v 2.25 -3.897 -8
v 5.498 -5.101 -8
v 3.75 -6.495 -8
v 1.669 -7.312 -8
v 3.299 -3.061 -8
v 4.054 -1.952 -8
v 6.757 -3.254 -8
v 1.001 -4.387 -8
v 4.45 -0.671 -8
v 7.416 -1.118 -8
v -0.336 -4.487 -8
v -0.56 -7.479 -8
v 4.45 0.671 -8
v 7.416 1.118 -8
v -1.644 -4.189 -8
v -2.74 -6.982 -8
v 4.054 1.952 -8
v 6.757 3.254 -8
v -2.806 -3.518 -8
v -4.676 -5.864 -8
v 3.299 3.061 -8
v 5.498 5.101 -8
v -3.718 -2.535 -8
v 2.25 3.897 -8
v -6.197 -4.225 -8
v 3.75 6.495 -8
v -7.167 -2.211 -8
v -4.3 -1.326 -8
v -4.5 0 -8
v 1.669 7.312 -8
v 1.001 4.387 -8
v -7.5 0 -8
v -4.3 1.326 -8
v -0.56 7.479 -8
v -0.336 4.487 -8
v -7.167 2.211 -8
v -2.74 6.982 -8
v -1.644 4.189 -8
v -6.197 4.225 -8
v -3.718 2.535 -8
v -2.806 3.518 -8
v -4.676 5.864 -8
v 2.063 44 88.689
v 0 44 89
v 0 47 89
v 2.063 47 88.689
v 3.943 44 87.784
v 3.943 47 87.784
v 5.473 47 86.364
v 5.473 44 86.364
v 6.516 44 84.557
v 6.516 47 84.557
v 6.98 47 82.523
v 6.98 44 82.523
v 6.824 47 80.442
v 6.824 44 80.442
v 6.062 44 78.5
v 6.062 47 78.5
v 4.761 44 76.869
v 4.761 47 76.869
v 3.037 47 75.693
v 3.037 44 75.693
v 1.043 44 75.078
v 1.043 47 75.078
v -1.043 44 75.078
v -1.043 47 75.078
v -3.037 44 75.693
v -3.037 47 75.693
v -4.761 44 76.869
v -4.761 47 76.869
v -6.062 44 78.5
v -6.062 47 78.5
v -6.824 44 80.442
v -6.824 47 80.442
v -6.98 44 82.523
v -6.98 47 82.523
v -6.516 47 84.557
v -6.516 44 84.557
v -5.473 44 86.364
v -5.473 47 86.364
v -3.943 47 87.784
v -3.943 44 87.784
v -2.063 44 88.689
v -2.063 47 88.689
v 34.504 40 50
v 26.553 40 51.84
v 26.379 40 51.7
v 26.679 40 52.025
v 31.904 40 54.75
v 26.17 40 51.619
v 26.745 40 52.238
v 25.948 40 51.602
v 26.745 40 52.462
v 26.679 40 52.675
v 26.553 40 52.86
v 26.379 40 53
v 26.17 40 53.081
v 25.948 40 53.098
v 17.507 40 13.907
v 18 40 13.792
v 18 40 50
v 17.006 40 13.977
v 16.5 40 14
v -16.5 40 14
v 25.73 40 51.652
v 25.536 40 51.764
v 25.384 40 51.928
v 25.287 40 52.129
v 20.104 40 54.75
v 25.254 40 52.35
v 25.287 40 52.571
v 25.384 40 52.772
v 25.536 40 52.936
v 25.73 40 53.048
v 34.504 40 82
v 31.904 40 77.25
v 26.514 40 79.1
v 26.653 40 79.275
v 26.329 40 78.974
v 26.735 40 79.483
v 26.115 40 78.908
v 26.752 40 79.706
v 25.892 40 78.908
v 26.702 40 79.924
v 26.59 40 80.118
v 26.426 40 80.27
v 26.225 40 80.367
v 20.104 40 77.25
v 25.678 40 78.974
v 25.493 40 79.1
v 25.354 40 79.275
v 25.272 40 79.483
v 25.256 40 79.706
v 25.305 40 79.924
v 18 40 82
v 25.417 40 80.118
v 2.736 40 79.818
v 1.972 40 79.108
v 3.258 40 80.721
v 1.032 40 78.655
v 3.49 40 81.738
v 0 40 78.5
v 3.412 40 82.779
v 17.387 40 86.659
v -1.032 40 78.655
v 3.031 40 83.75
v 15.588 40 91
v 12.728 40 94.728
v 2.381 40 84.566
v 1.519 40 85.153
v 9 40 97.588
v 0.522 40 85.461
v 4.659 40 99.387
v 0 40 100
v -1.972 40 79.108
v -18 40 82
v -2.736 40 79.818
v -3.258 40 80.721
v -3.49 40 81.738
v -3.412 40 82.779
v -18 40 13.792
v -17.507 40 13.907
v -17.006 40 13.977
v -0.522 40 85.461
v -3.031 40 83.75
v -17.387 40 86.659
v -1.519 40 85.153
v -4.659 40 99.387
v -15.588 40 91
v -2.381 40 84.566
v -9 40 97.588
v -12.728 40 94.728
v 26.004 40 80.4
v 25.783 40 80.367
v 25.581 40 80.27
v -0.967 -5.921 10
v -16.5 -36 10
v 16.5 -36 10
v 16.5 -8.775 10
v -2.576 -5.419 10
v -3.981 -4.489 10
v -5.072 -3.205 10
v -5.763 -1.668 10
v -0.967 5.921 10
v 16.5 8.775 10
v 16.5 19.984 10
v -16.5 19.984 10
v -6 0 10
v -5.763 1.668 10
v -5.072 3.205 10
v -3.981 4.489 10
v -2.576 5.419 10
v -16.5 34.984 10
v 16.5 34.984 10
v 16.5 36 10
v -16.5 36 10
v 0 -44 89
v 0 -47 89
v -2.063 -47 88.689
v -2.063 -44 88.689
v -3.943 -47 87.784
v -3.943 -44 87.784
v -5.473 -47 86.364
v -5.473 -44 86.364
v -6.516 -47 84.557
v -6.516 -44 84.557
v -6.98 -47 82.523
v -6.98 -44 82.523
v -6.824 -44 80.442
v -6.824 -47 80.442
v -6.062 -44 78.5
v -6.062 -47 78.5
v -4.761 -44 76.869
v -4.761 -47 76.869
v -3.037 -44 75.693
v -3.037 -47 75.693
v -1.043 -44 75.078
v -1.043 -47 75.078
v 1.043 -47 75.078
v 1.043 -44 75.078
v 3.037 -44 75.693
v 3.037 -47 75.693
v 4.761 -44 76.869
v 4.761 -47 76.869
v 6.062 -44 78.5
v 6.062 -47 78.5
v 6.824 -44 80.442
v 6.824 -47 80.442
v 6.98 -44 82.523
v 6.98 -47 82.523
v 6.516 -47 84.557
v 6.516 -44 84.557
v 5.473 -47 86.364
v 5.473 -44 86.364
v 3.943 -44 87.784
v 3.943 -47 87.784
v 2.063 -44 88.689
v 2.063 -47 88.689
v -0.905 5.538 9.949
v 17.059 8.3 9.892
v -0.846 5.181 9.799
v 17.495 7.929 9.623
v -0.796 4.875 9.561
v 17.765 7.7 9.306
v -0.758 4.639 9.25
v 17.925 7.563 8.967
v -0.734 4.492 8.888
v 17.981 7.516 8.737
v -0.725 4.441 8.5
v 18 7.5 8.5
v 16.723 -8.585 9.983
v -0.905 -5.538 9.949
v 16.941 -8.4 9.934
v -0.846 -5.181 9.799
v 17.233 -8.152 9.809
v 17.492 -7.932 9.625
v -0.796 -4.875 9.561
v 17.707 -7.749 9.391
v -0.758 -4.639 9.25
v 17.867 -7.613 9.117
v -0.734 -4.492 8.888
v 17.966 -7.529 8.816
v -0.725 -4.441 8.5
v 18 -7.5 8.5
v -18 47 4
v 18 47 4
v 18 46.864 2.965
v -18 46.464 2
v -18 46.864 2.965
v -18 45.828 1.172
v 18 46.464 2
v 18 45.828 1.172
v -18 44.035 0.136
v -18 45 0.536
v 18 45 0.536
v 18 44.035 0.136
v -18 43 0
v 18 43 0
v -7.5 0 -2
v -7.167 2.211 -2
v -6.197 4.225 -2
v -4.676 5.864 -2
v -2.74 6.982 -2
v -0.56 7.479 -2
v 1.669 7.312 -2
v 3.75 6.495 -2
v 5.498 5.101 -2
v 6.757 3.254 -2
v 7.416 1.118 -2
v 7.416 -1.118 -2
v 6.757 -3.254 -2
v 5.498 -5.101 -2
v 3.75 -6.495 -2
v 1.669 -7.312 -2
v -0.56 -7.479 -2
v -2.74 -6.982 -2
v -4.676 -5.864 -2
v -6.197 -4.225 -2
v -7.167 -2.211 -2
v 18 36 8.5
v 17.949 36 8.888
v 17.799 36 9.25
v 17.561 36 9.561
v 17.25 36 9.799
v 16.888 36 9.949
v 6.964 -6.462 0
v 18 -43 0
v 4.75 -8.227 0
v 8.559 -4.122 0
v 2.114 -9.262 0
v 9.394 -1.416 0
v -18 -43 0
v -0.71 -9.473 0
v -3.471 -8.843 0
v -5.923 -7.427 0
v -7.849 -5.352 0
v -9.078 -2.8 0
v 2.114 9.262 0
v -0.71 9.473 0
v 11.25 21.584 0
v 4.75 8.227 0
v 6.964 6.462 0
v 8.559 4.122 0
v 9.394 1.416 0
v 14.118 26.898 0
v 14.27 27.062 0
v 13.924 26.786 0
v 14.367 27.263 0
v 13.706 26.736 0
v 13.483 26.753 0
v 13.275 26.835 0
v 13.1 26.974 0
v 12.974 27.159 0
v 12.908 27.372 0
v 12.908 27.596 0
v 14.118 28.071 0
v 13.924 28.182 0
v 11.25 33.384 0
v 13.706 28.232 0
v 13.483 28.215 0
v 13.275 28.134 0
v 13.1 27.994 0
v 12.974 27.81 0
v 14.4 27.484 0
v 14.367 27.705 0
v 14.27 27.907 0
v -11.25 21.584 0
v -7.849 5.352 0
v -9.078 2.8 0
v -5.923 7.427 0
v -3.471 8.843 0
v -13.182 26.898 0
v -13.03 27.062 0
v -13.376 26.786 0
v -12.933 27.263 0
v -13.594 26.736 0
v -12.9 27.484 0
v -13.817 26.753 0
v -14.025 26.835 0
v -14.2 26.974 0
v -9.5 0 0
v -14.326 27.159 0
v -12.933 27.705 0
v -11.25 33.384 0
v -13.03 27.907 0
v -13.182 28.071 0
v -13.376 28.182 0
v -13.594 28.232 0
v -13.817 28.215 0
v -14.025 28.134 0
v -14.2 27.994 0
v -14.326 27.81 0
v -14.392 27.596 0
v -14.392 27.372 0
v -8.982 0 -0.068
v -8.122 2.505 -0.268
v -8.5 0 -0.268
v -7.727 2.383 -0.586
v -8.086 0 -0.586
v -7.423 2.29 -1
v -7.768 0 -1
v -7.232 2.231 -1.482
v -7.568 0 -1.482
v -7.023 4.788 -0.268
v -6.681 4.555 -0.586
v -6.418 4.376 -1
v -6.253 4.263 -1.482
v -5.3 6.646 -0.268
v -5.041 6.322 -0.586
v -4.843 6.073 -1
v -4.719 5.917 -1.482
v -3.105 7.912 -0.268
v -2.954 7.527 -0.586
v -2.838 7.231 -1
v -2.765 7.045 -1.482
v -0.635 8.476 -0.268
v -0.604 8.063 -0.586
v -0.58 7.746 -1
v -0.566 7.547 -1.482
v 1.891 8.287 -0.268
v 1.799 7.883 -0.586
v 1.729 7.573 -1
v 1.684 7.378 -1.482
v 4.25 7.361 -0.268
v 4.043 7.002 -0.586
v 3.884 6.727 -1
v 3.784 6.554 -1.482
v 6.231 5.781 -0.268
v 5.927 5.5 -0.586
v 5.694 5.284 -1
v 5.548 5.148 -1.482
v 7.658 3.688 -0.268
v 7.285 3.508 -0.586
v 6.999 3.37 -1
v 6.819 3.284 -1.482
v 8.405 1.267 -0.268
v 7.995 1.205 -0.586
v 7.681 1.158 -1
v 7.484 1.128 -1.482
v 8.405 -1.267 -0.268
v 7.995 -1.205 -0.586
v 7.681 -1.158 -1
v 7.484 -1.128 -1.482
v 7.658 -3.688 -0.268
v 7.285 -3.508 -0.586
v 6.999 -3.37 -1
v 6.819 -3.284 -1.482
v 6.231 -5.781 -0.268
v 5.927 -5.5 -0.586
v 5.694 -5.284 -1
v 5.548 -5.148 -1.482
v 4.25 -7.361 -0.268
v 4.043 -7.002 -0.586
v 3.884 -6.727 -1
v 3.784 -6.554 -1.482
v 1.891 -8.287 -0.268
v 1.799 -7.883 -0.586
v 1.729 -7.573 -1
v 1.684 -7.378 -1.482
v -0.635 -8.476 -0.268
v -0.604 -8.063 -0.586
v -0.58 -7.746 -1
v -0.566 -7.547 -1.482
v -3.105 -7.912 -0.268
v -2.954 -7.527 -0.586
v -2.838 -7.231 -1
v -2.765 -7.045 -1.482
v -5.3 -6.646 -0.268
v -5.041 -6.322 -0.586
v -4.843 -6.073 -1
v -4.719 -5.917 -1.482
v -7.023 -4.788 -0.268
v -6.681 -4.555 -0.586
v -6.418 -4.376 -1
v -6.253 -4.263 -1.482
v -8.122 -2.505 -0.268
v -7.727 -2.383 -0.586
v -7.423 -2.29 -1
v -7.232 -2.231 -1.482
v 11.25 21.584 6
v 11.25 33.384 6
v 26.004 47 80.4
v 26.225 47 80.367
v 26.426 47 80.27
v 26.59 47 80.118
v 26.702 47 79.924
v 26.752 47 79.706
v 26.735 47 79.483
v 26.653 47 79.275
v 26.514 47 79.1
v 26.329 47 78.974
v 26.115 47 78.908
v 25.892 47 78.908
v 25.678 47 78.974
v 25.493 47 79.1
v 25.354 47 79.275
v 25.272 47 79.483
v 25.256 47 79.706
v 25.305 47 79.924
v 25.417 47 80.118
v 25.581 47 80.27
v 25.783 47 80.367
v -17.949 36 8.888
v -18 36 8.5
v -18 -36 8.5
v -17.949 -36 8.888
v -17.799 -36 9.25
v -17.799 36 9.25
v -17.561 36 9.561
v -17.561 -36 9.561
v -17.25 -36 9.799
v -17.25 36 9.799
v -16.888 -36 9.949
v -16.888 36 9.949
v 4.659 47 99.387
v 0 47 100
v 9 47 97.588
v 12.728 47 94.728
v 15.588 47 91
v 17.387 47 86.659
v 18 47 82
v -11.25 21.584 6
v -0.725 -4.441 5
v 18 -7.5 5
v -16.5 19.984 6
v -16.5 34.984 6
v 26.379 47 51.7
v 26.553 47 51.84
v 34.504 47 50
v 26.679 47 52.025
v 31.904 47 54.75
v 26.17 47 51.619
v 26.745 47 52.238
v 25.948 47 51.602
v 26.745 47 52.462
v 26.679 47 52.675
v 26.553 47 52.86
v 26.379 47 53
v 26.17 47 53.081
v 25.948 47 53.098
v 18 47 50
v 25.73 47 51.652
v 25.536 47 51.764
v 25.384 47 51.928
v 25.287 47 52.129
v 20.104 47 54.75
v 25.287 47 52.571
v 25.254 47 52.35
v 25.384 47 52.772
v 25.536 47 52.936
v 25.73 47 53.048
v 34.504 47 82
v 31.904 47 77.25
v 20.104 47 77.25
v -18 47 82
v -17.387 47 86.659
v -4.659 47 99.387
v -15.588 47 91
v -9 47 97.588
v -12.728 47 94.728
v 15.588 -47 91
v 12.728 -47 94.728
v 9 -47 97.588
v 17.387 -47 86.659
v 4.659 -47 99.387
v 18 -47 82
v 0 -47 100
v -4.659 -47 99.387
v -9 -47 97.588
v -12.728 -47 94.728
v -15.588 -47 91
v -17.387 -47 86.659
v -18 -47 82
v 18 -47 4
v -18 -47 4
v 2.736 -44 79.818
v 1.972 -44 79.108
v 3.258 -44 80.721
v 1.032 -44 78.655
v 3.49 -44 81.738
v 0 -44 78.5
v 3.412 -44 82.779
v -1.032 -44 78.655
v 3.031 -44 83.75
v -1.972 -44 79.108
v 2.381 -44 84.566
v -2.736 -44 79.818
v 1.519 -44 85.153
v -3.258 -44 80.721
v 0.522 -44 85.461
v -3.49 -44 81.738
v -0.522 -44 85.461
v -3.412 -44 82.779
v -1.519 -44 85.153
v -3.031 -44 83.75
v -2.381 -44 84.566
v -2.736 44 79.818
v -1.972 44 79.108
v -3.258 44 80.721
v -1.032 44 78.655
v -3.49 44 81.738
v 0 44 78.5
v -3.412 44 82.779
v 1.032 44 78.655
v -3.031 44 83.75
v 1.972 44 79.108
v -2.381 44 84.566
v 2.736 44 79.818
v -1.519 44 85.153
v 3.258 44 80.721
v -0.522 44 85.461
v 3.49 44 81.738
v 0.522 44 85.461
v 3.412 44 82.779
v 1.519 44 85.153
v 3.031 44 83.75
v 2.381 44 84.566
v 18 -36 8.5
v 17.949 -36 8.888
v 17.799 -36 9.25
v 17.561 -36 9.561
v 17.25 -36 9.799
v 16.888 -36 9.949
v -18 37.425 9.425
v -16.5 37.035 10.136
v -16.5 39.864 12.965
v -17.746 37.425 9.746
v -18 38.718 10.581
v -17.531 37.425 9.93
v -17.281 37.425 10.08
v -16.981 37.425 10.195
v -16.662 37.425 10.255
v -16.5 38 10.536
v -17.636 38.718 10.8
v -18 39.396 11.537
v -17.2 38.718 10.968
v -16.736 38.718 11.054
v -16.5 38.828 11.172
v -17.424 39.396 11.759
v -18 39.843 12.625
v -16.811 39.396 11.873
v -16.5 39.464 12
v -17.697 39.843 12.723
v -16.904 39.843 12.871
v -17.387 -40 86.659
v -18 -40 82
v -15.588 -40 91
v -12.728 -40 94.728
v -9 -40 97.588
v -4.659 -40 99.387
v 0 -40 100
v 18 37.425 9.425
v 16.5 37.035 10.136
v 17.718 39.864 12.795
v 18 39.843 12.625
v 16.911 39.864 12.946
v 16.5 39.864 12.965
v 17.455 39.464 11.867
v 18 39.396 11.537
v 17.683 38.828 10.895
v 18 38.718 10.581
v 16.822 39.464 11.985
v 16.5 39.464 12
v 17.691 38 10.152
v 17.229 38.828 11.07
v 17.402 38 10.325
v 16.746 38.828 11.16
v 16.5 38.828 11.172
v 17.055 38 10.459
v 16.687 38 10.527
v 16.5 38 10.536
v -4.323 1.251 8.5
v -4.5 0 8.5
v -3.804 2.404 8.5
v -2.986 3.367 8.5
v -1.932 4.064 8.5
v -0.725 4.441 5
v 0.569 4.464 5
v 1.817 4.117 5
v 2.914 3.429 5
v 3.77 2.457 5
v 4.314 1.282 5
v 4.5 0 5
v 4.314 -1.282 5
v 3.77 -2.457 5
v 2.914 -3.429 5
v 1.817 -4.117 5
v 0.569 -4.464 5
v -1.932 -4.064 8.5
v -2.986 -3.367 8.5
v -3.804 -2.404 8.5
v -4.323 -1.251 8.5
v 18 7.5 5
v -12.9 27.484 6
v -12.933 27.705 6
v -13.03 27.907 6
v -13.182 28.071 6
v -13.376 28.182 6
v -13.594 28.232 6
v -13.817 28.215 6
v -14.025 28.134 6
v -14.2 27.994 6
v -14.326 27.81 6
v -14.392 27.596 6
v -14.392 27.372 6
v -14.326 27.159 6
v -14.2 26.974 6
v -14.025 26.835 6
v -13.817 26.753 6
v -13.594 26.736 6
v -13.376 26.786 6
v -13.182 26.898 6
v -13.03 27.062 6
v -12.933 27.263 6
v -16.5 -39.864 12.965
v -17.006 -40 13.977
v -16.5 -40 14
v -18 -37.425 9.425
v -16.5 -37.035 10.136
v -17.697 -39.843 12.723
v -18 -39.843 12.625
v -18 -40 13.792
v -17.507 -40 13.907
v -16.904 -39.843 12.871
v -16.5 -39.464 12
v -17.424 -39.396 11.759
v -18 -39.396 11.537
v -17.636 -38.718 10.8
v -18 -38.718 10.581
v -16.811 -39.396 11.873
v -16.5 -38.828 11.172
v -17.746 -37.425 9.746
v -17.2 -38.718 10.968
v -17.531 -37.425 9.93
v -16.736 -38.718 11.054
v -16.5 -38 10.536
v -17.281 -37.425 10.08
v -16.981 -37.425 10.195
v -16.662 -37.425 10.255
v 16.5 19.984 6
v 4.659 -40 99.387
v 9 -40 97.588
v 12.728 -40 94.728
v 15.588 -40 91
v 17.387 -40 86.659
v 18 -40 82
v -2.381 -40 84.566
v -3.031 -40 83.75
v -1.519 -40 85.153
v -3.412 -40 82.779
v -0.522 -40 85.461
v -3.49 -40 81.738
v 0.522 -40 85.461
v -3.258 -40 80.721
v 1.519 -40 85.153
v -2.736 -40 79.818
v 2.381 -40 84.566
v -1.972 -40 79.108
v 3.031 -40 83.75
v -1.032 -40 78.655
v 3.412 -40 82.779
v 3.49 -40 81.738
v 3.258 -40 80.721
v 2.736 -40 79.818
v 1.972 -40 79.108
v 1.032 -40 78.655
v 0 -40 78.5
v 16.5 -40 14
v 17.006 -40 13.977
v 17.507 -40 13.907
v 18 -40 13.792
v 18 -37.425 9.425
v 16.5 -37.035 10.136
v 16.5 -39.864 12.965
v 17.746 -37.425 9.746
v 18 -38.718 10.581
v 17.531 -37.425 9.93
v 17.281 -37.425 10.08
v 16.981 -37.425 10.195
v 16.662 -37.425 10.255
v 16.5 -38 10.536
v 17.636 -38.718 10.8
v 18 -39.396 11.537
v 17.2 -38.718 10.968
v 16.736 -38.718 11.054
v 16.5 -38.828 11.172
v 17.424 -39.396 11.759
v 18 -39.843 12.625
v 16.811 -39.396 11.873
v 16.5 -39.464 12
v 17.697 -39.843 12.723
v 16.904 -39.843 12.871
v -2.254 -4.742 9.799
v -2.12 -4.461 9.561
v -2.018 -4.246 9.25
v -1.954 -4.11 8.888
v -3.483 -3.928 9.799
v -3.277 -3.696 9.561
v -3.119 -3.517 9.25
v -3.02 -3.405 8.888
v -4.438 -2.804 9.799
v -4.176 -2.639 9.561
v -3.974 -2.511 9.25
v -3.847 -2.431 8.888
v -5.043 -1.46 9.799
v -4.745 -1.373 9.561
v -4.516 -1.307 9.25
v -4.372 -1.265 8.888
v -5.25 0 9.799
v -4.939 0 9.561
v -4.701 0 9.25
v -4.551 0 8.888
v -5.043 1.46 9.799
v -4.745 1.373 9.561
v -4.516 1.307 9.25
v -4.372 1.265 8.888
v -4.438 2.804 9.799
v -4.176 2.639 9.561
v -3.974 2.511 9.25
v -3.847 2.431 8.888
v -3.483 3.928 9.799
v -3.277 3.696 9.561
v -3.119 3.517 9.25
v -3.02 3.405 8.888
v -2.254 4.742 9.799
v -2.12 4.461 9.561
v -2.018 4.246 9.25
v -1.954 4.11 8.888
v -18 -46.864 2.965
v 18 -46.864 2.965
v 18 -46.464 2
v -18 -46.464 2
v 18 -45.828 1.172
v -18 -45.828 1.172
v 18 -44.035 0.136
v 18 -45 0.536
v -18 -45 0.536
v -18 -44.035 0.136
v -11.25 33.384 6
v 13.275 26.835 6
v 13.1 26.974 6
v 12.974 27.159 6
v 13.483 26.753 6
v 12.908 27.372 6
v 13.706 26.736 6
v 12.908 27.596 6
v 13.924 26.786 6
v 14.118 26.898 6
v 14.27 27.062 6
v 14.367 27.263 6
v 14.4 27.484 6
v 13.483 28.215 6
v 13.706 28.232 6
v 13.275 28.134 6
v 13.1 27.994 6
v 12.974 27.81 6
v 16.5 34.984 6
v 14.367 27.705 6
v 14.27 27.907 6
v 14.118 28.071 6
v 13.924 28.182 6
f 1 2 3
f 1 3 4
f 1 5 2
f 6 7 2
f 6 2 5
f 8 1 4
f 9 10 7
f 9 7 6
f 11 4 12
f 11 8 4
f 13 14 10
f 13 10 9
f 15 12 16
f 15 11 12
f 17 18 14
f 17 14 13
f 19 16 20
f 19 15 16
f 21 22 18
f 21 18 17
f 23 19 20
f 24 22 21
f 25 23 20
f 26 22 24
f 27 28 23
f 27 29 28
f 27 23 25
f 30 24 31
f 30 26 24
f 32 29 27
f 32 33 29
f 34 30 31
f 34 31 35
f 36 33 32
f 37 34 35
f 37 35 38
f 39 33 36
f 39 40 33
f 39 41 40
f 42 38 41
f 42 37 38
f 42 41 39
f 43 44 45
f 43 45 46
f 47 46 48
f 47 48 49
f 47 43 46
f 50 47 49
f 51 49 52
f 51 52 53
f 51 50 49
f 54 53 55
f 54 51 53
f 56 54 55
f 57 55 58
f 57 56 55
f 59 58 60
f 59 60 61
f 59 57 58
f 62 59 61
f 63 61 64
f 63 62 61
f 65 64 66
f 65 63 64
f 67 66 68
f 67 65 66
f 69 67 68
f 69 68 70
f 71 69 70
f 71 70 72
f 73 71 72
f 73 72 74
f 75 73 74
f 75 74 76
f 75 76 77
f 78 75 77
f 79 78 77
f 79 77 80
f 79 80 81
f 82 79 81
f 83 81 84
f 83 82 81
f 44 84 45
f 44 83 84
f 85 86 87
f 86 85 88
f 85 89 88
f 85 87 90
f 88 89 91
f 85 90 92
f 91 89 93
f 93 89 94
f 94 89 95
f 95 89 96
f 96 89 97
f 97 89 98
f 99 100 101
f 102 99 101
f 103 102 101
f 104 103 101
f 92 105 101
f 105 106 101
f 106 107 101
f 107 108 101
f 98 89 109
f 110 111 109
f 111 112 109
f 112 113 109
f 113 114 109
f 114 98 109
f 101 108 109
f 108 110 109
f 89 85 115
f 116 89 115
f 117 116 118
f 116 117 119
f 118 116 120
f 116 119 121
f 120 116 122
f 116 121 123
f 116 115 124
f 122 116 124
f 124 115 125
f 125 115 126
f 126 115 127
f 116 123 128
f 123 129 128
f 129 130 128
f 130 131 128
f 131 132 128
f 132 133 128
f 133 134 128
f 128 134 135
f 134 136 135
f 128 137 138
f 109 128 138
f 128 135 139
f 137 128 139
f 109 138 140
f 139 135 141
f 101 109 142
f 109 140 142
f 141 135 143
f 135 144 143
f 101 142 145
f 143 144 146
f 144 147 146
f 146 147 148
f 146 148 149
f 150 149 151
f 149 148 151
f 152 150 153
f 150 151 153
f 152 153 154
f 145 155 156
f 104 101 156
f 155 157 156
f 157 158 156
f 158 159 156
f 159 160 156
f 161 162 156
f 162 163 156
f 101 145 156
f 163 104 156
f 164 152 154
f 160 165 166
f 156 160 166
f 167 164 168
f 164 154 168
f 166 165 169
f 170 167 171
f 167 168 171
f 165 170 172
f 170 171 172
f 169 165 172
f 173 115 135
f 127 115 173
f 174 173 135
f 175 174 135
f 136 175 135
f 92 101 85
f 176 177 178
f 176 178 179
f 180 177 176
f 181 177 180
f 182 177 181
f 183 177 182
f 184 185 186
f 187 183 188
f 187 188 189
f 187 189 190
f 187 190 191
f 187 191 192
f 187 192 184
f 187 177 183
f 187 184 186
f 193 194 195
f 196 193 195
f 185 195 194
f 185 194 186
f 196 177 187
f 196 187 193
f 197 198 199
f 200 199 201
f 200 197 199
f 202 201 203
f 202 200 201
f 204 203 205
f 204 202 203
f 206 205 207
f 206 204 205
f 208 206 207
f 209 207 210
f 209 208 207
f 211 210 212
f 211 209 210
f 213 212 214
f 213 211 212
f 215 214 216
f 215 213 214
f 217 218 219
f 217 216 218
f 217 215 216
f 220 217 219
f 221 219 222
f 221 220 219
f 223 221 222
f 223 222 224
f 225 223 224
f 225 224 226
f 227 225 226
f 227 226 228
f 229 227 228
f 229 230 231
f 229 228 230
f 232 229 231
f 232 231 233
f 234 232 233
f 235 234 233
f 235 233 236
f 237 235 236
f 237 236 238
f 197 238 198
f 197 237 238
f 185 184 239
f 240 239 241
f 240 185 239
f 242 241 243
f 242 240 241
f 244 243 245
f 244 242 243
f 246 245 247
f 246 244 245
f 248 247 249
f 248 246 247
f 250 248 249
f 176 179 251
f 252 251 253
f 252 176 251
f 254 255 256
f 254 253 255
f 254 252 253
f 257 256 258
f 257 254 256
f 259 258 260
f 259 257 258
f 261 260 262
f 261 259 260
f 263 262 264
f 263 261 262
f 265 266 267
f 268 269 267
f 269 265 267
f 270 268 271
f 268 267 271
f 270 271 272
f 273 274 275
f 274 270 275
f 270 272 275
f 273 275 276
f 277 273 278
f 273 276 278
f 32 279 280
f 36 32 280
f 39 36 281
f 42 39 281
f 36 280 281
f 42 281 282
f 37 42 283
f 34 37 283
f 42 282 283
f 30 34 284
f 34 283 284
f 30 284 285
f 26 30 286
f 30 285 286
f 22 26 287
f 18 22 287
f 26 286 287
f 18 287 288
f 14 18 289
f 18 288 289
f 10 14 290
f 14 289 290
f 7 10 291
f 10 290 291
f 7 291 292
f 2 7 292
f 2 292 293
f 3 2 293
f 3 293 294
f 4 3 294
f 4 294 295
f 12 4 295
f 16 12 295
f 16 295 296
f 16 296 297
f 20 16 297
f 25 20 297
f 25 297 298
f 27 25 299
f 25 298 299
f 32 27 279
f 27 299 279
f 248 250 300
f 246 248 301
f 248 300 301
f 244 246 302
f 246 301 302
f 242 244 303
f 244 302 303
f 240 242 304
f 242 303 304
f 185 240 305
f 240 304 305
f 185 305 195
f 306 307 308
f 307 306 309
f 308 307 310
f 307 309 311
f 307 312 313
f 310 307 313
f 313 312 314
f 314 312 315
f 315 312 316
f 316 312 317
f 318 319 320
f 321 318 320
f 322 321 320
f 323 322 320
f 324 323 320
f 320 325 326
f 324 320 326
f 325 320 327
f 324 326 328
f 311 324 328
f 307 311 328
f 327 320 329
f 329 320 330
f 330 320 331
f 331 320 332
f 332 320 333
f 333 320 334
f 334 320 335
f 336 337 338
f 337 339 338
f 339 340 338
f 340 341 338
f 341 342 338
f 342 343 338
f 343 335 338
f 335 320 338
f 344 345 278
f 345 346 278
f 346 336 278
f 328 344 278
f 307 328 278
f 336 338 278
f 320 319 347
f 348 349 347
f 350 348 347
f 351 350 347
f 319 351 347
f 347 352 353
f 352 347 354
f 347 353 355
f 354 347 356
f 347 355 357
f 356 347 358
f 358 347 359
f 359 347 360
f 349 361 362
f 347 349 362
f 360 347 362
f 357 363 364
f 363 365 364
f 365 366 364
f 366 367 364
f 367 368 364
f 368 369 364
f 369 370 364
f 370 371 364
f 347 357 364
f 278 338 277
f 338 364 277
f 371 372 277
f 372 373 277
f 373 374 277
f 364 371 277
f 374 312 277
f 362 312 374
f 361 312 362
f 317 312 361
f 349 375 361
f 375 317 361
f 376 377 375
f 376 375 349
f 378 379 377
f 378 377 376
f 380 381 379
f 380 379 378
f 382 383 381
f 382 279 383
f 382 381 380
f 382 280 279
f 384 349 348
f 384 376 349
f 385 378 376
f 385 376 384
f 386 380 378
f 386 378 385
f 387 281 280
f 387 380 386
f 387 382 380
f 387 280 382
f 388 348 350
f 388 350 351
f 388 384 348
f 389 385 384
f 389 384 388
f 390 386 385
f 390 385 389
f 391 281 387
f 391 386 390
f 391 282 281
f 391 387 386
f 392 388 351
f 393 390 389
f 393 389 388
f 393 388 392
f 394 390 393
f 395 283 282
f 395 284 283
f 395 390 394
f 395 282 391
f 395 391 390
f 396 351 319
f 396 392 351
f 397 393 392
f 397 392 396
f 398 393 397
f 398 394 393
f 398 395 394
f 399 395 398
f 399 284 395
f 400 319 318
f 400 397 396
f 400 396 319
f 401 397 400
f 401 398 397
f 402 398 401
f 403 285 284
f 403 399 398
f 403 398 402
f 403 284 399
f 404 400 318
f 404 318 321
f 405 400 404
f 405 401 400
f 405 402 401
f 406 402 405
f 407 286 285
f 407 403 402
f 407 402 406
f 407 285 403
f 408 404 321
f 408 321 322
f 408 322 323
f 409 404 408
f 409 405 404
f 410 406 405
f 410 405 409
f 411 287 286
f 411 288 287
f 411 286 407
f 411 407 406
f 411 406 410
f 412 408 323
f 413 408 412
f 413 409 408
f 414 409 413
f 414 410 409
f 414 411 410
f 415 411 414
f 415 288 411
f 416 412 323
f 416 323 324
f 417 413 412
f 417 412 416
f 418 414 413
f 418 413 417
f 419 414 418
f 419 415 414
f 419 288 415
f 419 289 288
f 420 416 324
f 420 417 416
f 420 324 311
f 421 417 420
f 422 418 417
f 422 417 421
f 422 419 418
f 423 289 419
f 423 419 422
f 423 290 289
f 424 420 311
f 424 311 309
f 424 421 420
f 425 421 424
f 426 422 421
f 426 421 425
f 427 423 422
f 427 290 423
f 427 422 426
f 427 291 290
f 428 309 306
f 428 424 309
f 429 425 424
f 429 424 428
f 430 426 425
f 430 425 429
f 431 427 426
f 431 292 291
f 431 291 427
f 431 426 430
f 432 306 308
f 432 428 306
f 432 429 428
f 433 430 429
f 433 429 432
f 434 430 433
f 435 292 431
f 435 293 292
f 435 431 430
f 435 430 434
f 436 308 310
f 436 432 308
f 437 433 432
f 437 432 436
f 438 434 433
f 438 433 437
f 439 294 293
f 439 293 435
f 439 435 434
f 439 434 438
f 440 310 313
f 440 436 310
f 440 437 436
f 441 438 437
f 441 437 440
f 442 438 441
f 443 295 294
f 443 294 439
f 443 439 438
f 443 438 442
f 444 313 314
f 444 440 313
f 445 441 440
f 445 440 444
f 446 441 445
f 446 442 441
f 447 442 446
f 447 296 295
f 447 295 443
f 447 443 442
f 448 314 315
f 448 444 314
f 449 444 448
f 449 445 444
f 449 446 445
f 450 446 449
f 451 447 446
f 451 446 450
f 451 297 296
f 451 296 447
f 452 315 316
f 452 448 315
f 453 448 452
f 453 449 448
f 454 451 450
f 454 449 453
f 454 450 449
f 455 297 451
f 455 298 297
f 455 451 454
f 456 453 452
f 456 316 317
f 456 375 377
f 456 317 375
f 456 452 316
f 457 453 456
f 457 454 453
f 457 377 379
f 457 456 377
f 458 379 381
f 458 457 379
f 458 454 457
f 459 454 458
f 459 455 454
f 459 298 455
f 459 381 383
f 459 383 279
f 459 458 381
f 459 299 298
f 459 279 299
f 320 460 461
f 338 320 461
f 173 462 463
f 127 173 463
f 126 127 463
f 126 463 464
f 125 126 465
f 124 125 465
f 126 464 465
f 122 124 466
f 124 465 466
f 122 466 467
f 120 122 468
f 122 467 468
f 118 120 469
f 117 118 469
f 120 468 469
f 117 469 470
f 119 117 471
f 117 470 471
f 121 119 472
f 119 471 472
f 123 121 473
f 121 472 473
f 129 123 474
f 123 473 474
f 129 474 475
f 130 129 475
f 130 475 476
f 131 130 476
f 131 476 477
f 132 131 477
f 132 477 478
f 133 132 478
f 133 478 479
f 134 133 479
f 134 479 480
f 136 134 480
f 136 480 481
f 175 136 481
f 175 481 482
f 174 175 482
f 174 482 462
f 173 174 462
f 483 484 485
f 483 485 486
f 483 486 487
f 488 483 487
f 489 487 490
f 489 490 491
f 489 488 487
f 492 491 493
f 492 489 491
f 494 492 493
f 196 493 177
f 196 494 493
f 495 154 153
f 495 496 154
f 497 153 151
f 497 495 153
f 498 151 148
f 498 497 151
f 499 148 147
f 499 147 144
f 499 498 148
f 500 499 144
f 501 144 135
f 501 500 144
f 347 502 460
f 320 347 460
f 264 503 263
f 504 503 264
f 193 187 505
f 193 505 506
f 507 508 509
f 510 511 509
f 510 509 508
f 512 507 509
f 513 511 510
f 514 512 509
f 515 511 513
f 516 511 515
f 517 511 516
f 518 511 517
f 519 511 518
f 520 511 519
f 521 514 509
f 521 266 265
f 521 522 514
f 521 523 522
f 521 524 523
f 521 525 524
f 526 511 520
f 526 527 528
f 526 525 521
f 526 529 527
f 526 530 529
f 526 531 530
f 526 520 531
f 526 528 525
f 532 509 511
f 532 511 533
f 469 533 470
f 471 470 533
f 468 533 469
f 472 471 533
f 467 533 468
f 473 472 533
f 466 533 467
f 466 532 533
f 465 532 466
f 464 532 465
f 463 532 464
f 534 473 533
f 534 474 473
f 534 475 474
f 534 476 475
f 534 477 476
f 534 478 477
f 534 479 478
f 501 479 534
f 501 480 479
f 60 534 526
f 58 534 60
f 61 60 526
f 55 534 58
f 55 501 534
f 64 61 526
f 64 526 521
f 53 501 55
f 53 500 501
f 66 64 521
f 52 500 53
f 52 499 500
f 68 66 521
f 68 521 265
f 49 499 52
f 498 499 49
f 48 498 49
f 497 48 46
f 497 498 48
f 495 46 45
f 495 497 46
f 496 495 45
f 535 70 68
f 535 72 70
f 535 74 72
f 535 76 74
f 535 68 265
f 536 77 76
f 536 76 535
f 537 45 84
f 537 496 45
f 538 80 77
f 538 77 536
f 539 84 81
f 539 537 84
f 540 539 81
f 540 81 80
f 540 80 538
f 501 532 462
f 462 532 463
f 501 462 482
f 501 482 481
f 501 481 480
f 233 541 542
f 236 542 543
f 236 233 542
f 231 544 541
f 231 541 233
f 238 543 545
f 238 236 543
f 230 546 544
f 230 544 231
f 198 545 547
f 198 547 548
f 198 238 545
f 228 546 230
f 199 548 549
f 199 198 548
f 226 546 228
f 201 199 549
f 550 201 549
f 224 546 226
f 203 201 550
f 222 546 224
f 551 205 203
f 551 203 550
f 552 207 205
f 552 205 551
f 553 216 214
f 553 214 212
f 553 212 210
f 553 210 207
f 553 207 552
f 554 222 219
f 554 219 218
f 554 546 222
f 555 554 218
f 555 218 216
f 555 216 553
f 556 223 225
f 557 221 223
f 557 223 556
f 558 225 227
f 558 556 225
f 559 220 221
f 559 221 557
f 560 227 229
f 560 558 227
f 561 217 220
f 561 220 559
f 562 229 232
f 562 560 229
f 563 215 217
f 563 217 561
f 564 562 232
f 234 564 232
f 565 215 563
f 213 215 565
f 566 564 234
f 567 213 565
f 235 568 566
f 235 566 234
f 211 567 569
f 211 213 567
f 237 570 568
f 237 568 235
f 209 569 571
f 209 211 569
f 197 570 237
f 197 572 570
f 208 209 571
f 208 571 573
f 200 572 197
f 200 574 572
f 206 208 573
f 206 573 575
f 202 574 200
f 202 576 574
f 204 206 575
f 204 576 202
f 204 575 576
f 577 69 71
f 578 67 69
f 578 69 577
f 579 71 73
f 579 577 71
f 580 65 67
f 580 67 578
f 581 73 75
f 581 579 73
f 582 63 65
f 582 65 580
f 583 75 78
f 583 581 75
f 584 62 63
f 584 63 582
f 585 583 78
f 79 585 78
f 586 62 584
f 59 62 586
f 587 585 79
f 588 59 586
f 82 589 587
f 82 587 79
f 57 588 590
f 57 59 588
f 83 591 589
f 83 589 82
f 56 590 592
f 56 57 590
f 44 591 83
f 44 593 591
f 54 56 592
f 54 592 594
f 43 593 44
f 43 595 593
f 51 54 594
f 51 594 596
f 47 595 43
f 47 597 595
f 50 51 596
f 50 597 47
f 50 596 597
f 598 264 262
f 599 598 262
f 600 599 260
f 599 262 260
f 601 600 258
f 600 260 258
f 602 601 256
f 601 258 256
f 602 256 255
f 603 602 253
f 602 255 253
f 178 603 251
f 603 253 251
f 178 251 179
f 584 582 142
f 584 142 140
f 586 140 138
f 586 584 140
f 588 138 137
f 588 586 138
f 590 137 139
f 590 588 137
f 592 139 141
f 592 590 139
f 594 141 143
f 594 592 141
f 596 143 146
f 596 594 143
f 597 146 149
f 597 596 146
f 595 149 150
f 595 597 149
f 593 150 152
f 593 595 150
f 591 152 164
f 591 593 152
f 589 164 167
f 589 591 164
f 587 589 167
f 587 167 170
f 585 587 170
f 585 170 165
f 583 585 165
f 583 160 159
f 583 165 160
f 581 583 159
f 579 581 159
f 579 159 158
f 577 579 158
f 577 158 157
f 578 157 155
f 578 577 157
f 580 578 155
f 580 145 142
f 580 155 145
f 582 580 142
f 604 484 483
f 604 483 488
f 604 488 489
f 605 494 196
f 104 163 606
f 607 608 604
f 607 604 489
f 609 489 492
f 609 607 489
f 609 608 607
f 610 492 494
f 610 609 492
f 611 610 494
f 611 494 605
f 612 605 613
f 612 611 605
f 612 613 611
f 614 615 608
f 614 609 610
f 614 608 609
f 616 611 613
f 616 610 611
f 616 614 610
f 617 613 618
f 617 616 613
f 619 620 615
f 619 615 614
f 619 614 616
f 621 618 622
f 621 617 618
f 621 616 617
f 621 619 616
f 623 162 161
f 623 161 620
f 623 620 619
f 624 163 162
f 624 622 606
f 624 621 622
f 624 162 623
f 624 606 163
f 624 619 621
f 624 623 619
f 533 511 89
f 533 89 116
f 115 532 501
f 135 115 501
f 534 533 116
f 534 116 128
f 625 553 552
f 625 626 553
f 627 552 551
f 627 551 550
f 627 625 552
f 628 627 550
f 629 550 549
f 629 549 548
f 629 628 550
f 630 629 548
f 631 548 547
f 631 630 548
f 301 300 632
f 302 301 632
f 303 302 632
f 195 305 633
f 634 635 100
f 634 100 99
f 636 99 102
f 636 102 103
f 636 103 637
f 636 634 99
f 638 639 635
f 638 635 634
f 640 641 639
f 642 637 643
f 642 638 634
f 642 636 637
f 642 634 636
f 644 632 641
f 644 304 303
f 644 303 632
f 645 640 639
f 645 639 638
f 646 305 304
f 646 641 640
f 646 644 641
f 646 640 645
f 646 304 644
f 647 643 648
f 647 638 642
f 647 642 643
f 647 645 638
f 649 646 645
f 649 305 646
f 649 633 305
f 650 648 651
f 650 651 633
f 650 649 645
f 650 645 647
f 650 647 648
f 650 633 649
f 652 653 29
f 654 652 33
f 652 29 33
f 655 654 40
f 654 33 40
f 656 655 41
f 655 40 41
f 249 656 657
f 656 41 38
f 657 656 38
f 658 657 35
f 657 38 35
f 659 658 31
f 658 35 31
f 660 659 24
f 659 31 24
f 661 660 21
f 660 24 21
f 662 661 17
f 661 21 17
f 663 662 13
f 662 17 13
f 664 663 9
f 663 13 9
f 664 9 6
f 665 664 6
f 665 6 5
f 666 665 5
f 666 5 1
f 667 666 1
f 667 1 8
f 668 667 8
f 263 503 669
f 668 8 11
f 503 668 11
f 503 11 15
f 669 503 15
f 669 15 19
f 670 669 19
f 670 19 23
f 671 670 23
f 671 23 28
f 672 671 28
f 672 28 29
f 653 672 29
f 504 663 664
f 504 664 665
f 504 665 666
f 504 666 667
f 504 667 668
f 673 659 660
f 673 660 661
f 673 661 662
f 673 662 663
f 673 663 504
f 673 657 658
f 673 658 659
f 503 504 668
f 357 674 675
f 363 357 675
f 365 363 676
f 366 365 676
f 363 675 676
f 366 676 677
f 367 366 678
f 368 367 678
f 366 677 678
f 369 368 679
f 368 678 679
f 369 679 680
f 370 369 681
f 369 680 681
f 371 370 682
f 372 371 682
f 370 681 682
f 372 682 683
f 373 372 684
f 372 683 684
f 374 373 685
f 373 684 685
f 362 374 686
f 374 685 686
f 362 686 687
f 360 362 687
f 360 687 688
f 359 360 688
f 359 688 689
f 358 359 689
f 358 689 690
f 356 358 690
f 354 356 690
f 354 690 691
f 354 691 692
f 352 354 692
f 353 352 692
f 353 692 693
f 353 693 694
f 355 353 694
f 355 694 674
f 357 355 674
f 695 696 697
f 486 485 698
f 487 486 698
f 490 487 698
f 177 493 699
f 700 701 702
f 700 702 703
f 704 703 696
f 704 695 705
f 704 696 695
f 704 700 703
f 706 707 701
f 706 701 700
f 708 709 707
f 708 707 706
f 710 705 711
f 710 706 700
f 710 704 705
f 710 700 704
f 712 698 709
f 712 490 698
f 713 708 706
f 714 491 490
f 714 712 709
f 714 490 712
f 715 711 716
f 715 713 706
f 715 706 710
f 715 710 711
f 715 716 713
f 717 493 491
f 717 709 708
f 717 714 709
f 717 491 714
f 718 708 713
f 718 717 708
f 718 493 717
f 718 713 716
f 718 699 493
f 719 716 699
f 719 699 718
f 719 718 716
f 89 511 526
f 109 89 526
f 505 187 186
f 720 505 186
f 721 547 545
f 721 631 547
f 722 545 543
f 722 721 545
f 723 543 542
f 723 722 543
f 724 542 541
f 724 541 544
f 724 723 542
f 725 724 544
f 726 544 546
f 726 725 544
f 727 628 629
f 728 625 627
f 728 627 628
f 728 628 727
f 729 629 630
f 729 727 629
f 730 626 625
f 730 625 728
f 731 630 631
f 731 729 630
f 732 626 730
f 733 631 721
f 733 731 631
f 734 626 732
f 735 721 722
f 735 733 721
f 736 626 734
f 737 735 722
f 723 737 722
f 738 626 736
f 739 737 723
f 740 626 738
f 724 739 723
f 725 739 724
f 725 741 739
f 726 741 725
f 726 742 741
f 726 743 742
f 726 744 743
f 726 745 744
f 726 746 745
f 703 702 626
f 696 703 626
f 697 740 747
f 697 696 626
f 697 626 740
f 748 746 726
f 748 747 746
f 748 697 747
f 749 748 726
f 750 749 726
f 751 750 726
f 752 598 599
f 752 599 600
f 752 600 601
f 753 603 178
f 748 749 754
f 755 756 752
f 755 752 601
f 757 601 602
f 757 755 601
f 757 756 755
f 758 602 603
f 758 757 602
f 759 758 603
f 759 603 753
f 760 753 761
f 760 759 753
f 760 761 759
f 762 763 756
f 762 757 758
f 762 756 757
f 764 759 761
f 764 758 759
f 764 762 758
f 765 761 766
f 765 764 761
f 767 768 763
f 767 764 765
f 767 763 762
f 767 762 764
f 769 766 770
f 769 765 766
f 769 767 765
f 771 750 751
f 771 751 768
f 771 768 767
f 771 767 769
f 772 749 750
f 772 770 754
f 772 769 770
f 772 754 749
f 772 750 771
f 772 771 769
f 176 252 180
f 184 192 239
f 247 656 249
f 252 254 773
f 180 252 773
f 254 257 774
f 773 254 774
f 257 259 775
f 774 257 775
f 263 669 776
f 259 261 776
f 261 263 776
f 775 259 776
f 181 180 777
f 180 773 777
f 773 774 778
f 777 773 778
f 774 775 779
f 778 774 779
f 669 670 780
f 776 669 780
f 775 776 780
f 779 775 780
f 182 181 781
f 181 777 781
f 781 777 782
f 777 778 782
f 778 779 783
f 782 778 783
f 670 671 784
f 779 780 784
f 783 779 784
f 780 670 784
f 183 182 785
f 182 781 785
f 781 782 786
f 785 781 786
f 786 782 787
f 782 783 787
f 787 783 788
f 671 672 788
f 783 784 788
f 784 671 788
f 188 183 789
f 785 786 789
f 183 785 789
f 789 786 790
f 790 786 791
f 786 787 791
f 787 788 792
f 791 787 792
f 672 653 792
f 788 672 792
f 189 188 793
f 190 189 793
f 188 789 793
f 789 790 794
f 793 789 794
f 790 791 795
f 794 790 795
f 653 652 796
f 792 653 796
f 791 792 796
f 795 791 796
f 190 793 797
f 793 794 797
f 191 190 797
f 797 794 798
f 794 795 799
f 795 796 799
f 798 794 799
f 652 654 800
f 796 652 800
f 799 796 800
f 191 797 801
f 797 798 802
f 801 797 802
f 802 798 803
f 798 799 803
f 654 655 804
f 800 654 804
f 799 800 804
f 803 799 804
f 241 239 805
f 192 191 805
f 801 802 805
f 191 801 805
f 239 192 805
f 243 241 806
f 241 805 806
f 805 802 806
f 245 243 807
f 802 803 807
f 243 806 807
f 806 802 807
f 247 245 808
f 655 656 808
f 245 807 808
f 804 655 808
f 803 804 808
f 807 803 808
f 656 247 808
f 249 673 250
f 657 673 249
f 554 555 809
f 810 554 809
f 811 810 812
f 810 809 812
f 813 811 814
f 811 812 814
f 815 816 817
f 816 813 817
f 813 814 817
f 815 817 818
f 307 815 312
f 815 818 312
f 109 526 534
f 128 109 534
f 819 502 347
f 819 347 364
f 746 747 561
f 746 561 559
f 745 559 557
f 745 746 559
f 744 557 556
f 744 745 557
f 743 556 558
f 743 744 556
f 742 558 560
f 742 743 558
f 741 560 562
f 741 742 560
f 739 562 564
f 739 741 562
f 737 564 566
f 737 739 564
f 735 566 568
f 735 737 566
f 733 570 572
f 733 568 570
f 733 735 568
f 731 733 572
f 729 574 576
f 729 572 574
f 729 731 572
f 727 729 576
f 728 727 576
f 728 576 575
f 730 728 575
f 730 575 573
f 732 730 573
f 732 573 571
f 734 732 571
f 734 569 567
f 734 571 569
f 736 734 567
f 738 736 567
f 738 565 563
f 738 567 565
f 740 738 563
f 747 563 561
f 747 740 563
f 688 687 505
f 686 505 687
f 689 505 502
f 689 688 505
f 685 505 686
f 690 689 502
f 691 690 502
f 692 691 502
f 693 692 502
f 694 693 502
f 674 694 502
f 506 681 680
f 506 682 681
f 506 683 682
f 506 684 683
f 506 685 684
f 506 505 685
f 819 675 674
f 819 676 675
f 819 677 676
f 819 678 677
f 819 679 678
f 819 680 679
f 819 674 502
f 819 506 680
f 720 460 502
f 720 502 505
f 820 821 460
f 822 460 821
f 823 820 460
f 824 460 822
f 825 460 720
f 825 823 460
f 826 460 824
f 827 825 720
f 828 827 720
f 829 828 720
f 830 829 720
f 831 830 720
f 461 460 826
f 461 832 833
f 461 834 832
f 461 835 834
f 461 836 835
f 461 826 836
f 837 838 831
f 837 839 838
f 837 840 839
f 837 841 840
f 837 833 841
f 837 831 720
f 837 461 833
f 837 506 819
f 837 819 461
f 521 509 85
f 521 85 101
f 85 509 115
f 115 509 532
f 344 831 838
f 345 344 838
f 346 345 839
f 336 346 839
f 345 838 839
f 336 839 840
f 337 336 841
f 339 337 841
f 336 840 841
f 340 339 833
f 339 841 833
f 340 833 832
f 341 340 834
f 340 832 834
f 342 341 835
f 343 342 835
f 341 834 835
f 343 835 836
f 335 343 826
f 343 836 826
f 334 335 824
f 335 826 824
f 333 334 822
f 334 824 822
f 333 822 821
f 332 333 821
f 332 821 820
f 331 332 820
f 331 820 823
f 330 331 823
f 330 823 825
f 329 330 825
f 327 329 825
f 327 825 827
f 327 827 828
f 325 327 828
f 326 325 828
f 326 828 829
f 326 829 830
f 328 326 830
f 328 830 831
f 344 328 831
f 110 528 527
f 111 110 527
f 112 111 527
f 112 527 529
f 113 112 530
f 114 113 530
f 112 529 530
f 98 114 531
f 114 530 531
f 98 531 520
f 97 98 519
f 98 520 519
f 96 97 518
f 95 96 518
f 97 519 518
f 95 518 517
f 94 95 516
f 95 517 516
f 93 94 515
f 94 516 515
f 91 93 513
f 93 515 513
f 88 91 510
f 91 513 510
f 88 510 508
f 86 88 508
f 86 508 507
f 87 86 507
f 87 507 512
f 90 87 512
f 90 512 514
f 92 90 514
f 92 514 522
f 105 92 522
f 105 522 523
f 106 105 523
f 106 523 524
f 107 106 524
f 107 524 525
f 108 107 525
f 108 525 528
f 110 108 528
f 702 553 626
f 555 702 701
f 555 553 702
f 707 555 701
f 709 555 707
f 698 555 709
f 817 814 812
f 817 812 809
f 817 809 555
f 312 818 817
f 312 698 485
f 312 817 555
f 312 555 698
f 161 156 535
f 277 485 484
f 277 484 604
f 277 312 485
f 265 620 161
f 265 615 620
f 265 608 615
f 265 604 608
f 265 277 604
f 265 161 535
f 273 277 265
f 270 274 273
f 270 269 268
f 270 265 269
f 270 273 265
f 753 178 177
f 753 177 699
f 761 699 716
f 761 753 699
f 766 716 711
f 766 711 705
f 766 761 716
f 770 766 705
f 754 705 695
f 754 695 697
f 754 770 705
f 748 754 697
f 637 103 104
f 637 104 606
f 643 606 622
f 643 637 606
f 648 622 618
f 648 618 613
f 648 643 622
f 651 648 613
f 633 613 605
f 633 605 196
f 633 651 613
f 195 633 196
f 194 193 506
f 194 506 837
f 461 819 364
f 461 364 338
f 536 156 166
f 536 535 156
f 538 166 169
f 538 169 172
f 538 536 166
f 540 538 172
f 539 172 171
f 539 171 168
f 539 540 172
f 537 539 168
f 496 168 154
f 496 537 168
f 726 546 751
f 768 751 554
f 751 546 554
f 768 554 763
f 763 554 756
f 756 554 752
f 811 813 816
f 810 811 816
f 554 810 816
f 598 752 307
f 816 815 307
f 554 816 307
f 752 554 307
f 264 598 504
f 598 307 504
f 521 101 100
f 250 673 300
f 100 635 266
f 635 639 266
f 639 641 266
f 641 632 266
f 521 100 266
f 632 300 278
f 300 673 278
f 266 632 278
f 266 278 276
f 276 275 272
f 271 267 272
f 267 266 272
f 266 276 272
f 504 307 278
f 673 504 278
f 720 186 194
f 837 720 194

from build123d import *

# Parameters (mm, degrees)
SKETCH1_W               = 94
SKETCH1_H               = 36
BOSS_EXTRUDE1_DEPTH     = 10
SKETCH2_W               = 36
SKETCH2_H               = 7
BOSS_EXTRUDE2_DEPTH     = 90
CUT_EXTRUDE1_DEPTH      = 139.419651784
CUT_EXTRUDE1_DEPTH_BACK = 139.419651784
SKETCH3_R               = 3.5
CUT_EXTRUDE2_DEPTH      = 139.419651784
CUT_EXTRUDE2_DEPTH_BACK = 3
SKETCH4_R               = 7
CUT_EXTRUDE3_START      = -3
SKETCH5_R               = 7
CUT_EXTRUDE3_DEPTH      = 3
FILLET1_R               = 18
SKETCH6_R               = 7.5
BOSS_EXTRUDE3_DEPTH     = 8
SKETCH7_R               = 4.5
CUT_EXTRUDE4_DEPTH      = 120.151164493
FILLET2_R               = 2
SKETCH9_R               = 0.75
SKETCH9_W               = 22.5
SKETCH9_H               = 11.8
CUT_EXTRUDE5_DEPTH      = 104.116439039
SKETCH10_W              = 33
SKETCH10_H              = 15
CUT_EXTRUDE6_DEPTH      = 4
SKETCH11_W              = 17
SKETCH11_H              = 32
BOSS_EXTRUDE4_DEPTH     = 7
CUT_EXTRUDE7_REACH      = 143.515
SKETCH12_R              = 0.75
SKETCH12_W              = 11.8
SKETCH12_H              = 22.5
CUT_EXTRUDE8_START      = -5
CUT_EXTRUDE8_DEPTH      = 5
FILLET3_R               = 1.5
FILLET4_R               = 4


# Some blends are built 0.0001 mm under size
with BuildPart() as part:
    # Sketch1 → Boss-Extrude1 (new body)
    with BuildSketch(Plane(origin=(0, 0, 0), x_dir=(0, 1, 0), z_dir=(0, 0, 1))):
        Rectangle(SKETCH1_W, SKETCH1_H)
    extrude(amount=BOSS_EXTRUDE1_DEPTH)

    # Sketch2 → Boss-Extrude2 (add)
    with BuildSketch(Plane.XY.offset(10)):
        with Locations((0, 43.5)):
            Rectangle(SKETCH2_W, SKETCH2_H)
        with Locations((0, -43.5)):
            Rectangle(SKETCH2_W, SKETCH2_H)
    extrude(amount=BOSS_EXTRUDE2_DEPTH)

    # Sketch3 → Cut-Extrude1 (cut, two sides: drawn at the far end of the back side and taken through both)
    with BuildSketch(Plane.XZ.offset(47).offset(-CUT_EXTRUDE1_DEPTH_BACK)):
        with Locations(Location((0, 82, 0), (0, 0, 270))):
            Circle(SKETCH3_R)
    extrude(amount=CUT_EXTRUDE1_DEPTH + CUT_EXTRUDE1_DEPTH_BACK, mode=Mode.SUBTRACT)

    # Sketch4 → Cut-Extrude2 (cut, two sides: drawn at the far end of the back side and taken through both)
    with BuildSketch(Plane.XZ.offset(47).offset(-CUT_EXTRUDE2_DEPTH_BACK)):
        with Locations(Location((0, 82, 0), (0, 0, 90))):
            Circle(SKETCH4_R)
    extrude(amount=CUT_EXTRUDE2_DEPTH + CUT_EXTRUDE2_DEPTH_BACK, mode=Mode.SUBTRACT)

    # Sketch5 → Cut-Extrude3 (cut)
    with BuildSketch(Plane(origin=(0, 47, 0), x_dir=(-1, 0, 0), z_dir=(0, 1, 0)).offset(CUT_EXTRUDE3_START)):
        with Locations(Location((0, 82, 0), (0, 0, 90))):
            Circle(SKETCH5_R)
    extrude(amount=CUT_EXTRUDE3_DEPTH, mode=Mode.SUBTRACT)

    # Fillet1
    fillet1_edges = [part.edges().sort_by_distance(p)[0] for p in [
        (18, -43.5, 100),
        (-18, -43.5, 100),
        (18, 43.5, 100),
        (-18, 43.5, 100),
    ]]
    fillet(fillet1_edges, radius=FILLET1_R - 0.0001)  # a hair under: the kernel refuses the full size

    # Sketch6 → Boss-Extrude3 (add)
    with BuildSketch(Plane(origin=(0, 0, 0), x_dir=(1, 0, 0), z_dir=(0, 0, -1))):
        with Locations(Location((0, 0, 0), (0, 0, 180))):
            Circle(SKETCH6_R)
    extrude(amount=BOSS_EXTRUDE3_DEPTH)

    # Sketch7 → Cut-Extrude4 (cut, through all)
    with BuildSketch(Plane(origin=(0, 0, -8), x_dir=(1, 0, 0), z_dir=(0, 0, -1))):
        with Locations(Location((0, 0, 0), (0, 0, 180))):
            Circle(SKETCH7_R)
    extrude(amount=-CUT_EXTRUDE4_DEPTH, mode=Mode.SUBTRACT)

    # Fillet2
    fillet2_edges = [part.edges().sort_by_distance(p)[0] for p in [
        (7.5, 0, 0),
    ]]
    fillet(fillet2_edges, radius=FILLET2_R)

    # Sketch9 → Cut-Extrude5 (cut, through all)
    with BuildSketch(Plane.XY.offset(10)):
        with Locations((-13.65, 27.484131785)):
            Circle(SKETCH9_R)
        with Locations((13.65, 27.484131785)):
            Circle(SKETCH9_R)
        with Locations((0, 27.484131785)):
            Rectangle(SKETCH9_W, SKETCH9_H)
    extrude(amount=-CUT_EXTRUDE5_DEPTH, mode=Mode.SUBTRACT)

    # Sketch10 → Cut-Extrude6 (cut)
    with BuildSketch(Plane.XY.offset(10)):
        with Locations((0, 27.484131785)):
            Rectangle(SKETCH10_W, SKETCH10_H)
    extrude(amount=-CUT_EXTRUDE6_DEPTH, mode=Mode.SUBTRACT)

    # Sketch11 → Boss-Extrude4 (add)
    with BuildSketch(Plane(origin=(0, 47, 0), x_dir=(-1, 0, 0), z_dir=(0, 1, 0))):
        with Locations((-26.003605519, 66)):
            Rectangle(SKETCH11_W, SKETCH11_H)
    extrude(amount=-BOSS_EXTRUDE4_DEPTH)

    # Sketch12 → Cut-Extrude7 (cut, up to next)
    with BuildSketch(Plane(origin=(0, 47, 0), x_dir=(-1, 0, 0), z_dir=(0, 1, 0)), mode=Mode.PRIVATE) as cut_extrude7_sk1:
        with Locations(Location((-26.003605519, 79.65, 0), (0, 0, 90))):
            Circle(SKETCH12_R)
    cut_extrude7_tool1 = extrude(cut_extrude7_sk1.sketch, amount=-CUT_EXTRUDE7_REACH, mode=Mode.PRIVATE) & part.part
    # Sketch12 → Cut-Extrude7 (cut, up to next)
    with BuildSketch(Plane(origin=(0, 47, 0), x_dir=(-1, 0, 0), z_dir=(0, 1, 0)), mode=Mode.PRIVATE) as cut_extrude7_sk2:
        with Locations((-26.003605519, 52.35)):
            Circle(SKETCH12_R)
    cut_extrude7_tool2 = extrude(cut_extrude7_sk2.sketch, amount=-CUT_EXTRUDE7_REACH, mode=Mode.PRIVATE) & part.part
    # Sketch12 → Cut-Extrude7 (cut, up to next)
    with BuildSketch(Plane(origin=(0, 47, 0), x_dir=(-1, 0, 0), z_dir=(0, 1, 0)), mode=Mode.PRIVATE) as cut_extrude7_sk3:
        with Locations((-26.003605519, 66)):
            Rectangle(SKETCH12_W, SKETCH12_H)
    cut_extrude7_tool3 = extrude(cut_extrude7_sk3.sketch, amount=-CUT_EXTRUDE7_REACH, mode=Mode.PRIVATE) & part.part
    add(cut_extrude7_tool1.solids().sort_by_distance((26.003606, 47, 79.65))[0], mode=Mode.SUBTRACT)
    add(cut_extrude7_tool2.solids().sort_by_distance((26.003606, 47, 52.35))[0], mode=Mode.SUBTRACT)
    add(cut_extrude7_tool3.solids().sort_by_distance((26.003606, 47, 66))[0], mode=Mode.SUBTRACT)

    # Sketch13 → Cut-Extrude8 (cut)
    with BuildSketch(Plane.XY.offset(10).offset(CUT_EXTRUDE8_START)):
        with BuildLine():
            Line((18, -7.5), (18, 7.5))
            Line((18, 7.5), (-0.72547331, 4.441135944))
            ThreePointArc((-0.72547331, 4.441135944), (4.5, 0), (-0.72547331, -4.441135944))
            Line((-0.72547331, -4.441135944), (18, -7.5))
        make_face()
    extrude(amount=CUT_EXTRUDE8_DEPTH, mode=Mode.SUBTRACT)

    # Fillet3
    fillet3_edges = [part.edges().sort_by_distance(p)[0] for p in [
        (-18, 0, 10),
        (18, -23.75, 10),
        (-3.428894129, 2.914221174, 10),
        (18, 23.75, 10),
        (8.637263345, -5.970567972, 10),
        (8.637263345, 5.970567972, 10),
    ]]
    fillet(fillet3_edges, radius=FILLET3_R - 0.0001)  # a hair under: the kernel refuses the full size

    # Fillet4
    # the kernel refuses this fillet: 4 mm, written as the material it adds along each edge
    with BuildSketch(Plane(origin=(16.5001, 40, 10), x_dir=(0, -1, 0), z_dir=(-1, 0, 0))) as fillet4_piece_1:
        with BuildLine():
            CenterArc((FILLET4_R, FILLET4_R), FILLET4_R, 180, 90)
            Line((0, FILLET4_R), (0, 0))
            Line((0, 0), (FILLET4_R, 0))
        make_face()
    extrude(amount=33.0002)
    with BuildSketch(Plane(origin=(16.5001, -40, 10), x_dir=(0, 1, 0), z_dir=(-1, 0, 0))) as fillet4_piece_2:
        with BuildLine():
            CenterArc((FILLET4_R, -FILLET4_R), FILLET4_R, 90, 90)
            Line((0, -FILLET4_R), (0, 0))
            Line((0, 0), (FILLET4_R, 0))
        make_face()
    extrude(amount=33.0002)
    with BuildSketch(Plane(origin=(-16.5001, -40, 8.5001), x_dir=(0.006283143965556653, 0, 0.9999802608561371), z_dir=(-0.9999802608561371, 0, 0.006283143965556653))) as fillet4_piece_3_section:
        with BuildLine():
            CenterArc((-1.4999 - FILLET4_R, FILLET4_R), FILLET4_R, 270, 90)
            Line((-1.4999 - FILLET4_R, 0), (-1.4999, 0))
            Line((-1.4999, 0), (-1.4999, FILLET4_R))
        make_face()
    fillet4_piece_3 = revolve(axis=Axis((-16.5001, -40, 8.5001), (0, 1, 0)), revolution_arc=359.64, mode=Mode.PRIVATE)
    fillet4_piece_3 = split(fillet4_piece_3, bisect_by=Plane(origin=(-18, -38.511467158, 9.644627934), z_dir=(1, 0, 0)), keep=Keep.TOP, mode=Mode.PRIVATE)
    add(fillet4_piece_3)
    with BuildSketch(Plane(origin=(-16.5001, 40, 8.5001), x_dir=(0.006283143965556653, 0, 0.9999802608561371), z_dir=(-0.9999802608561371, 0, 0.006283143965556653))) as fillet4_piece_4_section:
        with BuildLine():
            CenterArc((-1.4999 - FILLET4_R, -FILLET4_R), FILLET4_R, 0, 90)
            Line((-1.4999 - FILLET4_R, 0), (-1.4999, 0))
            Line((-1.4999, 0), (-1.4999, -FILLET4_R))
        make_face()
    fillet4_piece_4 = revolve(axis=Axis((-16.5001, 40, 8.5001), (0, 1, 0)), revolution_arc=359.64, mode=Mode.PRIVATE)
    fillet4_piece_4 = split(fillet4_piece_4, bisect_by=Plane(origin=(-18, 38.511467158, 9.644627939), z_dir=(1, 0, 0)), keep=Keep.TOP, mode=Mode.PRIVATE)
    add(fillet4_piece_4)
    with BuildSketch(Plane(origin=(16.5001, -40, 8.5001), x_dir=(-0.006283143965559021, 0, 0.9999802608561371), z_dir=(0.9999802608561371, 0, 0.006283143965559021))) as fillet4_piece_5_section:
        with BuildLine():
            CenterArc((-1.4999 - FILLET4_R, -FILLET4_R), FILLET4_R, 0, 90)
            Line((-1.4999 - FILLET4_R, 0), (-1.4999, 0))
            Line((-1.4999, 0), (-1.4999, -FILLET4_R))
        make_face()
    fillet4_piece_5 = revolve(axis=Axis((16.5001, -40, 8.5001), (0, -1, 0)), revolution_arc=359.64, mode=Mode.PRIVATE)
    fillet4_piece_5 = split(fillet4_piece_5, bisect_by=Plane(origin=(18, -38.511467161, 9.644627937), z_dir=(-1, 0, 0)), keep=Keep.TOP, mode=Mode.PRIVATE)
    add(fillet4_piece_5)
    with BuildSketch(Plane(origin=(16.5001, 40, 8.5001), x_dir=(-0.006283143965559021, 0, 0.9999802608561371), z_dir=(0.9999802608561371, 0, 0.006283143965559021))) as fillet4_piece_6_section:
        with BuildLine():
            CenterArc((-1.4999 - FILLET4_R, FILLET4_R), FILLET4_R, 270, 90)
            Line((-1.4999, FILLET4_R), (-1.4999, 0))
            Line((-1.4999, 0), (-1.4999 - FILLET4_R, 0))
        make_face()
    fillet4_piece_6 = revolve(axis=Axis((16.5001, 40, 8.5001), (0, -1, 0)), revolution_arc=359.64, mode=Mode.PRIVATE)
    fillet4_piece_6 = split(fillet4_piece_6, bisect_by=Plane(origin=(18, 38.511467202, 9.644627972), z_dir=(-1, 0, 0)), keep=Keep.TOP, mode=Mode.PRIVATE)
    add(fillet4_piece_6)
    # the kernel refuses this fillet: 4 mm, written as the material it takes off along each edge
    with BuildSketch(Plane(origin=(-28, -47, 0), x_dir=(0, 0, 1), z_dir=(1, 0, 0))) as fillet4_2_piece_1:
        with BuildLine():
            CenterArc((FILLET4_R, -FILLET4_R), FILLET4_R, 90, 90)
            Line((0, -FILLET4_R), (0, 0))
            Line((0, 0), (FILLET4_R, 0))
        make_face()
    extrude(amount=56, mode=Mode.SUBTRACT)
    with BuildSketch(Plane(origin=(28, 47, 0), x_dir=(0, -1, 0), z_dir=(-1, 0, 0))) as fillet4_2_piece_2:
        with BuildLine():
            CenterArc((FILLET4_R, FILLET4_R), FILLET4_R, 180, 90)
            Line((0, FILLET4_R), (0, 0))
            Line((0, 0), (FILLET4_R, 0))
        make_face()
    extrude(amount=56, mode=Mode.SUBTRACT)


solid = part.part
